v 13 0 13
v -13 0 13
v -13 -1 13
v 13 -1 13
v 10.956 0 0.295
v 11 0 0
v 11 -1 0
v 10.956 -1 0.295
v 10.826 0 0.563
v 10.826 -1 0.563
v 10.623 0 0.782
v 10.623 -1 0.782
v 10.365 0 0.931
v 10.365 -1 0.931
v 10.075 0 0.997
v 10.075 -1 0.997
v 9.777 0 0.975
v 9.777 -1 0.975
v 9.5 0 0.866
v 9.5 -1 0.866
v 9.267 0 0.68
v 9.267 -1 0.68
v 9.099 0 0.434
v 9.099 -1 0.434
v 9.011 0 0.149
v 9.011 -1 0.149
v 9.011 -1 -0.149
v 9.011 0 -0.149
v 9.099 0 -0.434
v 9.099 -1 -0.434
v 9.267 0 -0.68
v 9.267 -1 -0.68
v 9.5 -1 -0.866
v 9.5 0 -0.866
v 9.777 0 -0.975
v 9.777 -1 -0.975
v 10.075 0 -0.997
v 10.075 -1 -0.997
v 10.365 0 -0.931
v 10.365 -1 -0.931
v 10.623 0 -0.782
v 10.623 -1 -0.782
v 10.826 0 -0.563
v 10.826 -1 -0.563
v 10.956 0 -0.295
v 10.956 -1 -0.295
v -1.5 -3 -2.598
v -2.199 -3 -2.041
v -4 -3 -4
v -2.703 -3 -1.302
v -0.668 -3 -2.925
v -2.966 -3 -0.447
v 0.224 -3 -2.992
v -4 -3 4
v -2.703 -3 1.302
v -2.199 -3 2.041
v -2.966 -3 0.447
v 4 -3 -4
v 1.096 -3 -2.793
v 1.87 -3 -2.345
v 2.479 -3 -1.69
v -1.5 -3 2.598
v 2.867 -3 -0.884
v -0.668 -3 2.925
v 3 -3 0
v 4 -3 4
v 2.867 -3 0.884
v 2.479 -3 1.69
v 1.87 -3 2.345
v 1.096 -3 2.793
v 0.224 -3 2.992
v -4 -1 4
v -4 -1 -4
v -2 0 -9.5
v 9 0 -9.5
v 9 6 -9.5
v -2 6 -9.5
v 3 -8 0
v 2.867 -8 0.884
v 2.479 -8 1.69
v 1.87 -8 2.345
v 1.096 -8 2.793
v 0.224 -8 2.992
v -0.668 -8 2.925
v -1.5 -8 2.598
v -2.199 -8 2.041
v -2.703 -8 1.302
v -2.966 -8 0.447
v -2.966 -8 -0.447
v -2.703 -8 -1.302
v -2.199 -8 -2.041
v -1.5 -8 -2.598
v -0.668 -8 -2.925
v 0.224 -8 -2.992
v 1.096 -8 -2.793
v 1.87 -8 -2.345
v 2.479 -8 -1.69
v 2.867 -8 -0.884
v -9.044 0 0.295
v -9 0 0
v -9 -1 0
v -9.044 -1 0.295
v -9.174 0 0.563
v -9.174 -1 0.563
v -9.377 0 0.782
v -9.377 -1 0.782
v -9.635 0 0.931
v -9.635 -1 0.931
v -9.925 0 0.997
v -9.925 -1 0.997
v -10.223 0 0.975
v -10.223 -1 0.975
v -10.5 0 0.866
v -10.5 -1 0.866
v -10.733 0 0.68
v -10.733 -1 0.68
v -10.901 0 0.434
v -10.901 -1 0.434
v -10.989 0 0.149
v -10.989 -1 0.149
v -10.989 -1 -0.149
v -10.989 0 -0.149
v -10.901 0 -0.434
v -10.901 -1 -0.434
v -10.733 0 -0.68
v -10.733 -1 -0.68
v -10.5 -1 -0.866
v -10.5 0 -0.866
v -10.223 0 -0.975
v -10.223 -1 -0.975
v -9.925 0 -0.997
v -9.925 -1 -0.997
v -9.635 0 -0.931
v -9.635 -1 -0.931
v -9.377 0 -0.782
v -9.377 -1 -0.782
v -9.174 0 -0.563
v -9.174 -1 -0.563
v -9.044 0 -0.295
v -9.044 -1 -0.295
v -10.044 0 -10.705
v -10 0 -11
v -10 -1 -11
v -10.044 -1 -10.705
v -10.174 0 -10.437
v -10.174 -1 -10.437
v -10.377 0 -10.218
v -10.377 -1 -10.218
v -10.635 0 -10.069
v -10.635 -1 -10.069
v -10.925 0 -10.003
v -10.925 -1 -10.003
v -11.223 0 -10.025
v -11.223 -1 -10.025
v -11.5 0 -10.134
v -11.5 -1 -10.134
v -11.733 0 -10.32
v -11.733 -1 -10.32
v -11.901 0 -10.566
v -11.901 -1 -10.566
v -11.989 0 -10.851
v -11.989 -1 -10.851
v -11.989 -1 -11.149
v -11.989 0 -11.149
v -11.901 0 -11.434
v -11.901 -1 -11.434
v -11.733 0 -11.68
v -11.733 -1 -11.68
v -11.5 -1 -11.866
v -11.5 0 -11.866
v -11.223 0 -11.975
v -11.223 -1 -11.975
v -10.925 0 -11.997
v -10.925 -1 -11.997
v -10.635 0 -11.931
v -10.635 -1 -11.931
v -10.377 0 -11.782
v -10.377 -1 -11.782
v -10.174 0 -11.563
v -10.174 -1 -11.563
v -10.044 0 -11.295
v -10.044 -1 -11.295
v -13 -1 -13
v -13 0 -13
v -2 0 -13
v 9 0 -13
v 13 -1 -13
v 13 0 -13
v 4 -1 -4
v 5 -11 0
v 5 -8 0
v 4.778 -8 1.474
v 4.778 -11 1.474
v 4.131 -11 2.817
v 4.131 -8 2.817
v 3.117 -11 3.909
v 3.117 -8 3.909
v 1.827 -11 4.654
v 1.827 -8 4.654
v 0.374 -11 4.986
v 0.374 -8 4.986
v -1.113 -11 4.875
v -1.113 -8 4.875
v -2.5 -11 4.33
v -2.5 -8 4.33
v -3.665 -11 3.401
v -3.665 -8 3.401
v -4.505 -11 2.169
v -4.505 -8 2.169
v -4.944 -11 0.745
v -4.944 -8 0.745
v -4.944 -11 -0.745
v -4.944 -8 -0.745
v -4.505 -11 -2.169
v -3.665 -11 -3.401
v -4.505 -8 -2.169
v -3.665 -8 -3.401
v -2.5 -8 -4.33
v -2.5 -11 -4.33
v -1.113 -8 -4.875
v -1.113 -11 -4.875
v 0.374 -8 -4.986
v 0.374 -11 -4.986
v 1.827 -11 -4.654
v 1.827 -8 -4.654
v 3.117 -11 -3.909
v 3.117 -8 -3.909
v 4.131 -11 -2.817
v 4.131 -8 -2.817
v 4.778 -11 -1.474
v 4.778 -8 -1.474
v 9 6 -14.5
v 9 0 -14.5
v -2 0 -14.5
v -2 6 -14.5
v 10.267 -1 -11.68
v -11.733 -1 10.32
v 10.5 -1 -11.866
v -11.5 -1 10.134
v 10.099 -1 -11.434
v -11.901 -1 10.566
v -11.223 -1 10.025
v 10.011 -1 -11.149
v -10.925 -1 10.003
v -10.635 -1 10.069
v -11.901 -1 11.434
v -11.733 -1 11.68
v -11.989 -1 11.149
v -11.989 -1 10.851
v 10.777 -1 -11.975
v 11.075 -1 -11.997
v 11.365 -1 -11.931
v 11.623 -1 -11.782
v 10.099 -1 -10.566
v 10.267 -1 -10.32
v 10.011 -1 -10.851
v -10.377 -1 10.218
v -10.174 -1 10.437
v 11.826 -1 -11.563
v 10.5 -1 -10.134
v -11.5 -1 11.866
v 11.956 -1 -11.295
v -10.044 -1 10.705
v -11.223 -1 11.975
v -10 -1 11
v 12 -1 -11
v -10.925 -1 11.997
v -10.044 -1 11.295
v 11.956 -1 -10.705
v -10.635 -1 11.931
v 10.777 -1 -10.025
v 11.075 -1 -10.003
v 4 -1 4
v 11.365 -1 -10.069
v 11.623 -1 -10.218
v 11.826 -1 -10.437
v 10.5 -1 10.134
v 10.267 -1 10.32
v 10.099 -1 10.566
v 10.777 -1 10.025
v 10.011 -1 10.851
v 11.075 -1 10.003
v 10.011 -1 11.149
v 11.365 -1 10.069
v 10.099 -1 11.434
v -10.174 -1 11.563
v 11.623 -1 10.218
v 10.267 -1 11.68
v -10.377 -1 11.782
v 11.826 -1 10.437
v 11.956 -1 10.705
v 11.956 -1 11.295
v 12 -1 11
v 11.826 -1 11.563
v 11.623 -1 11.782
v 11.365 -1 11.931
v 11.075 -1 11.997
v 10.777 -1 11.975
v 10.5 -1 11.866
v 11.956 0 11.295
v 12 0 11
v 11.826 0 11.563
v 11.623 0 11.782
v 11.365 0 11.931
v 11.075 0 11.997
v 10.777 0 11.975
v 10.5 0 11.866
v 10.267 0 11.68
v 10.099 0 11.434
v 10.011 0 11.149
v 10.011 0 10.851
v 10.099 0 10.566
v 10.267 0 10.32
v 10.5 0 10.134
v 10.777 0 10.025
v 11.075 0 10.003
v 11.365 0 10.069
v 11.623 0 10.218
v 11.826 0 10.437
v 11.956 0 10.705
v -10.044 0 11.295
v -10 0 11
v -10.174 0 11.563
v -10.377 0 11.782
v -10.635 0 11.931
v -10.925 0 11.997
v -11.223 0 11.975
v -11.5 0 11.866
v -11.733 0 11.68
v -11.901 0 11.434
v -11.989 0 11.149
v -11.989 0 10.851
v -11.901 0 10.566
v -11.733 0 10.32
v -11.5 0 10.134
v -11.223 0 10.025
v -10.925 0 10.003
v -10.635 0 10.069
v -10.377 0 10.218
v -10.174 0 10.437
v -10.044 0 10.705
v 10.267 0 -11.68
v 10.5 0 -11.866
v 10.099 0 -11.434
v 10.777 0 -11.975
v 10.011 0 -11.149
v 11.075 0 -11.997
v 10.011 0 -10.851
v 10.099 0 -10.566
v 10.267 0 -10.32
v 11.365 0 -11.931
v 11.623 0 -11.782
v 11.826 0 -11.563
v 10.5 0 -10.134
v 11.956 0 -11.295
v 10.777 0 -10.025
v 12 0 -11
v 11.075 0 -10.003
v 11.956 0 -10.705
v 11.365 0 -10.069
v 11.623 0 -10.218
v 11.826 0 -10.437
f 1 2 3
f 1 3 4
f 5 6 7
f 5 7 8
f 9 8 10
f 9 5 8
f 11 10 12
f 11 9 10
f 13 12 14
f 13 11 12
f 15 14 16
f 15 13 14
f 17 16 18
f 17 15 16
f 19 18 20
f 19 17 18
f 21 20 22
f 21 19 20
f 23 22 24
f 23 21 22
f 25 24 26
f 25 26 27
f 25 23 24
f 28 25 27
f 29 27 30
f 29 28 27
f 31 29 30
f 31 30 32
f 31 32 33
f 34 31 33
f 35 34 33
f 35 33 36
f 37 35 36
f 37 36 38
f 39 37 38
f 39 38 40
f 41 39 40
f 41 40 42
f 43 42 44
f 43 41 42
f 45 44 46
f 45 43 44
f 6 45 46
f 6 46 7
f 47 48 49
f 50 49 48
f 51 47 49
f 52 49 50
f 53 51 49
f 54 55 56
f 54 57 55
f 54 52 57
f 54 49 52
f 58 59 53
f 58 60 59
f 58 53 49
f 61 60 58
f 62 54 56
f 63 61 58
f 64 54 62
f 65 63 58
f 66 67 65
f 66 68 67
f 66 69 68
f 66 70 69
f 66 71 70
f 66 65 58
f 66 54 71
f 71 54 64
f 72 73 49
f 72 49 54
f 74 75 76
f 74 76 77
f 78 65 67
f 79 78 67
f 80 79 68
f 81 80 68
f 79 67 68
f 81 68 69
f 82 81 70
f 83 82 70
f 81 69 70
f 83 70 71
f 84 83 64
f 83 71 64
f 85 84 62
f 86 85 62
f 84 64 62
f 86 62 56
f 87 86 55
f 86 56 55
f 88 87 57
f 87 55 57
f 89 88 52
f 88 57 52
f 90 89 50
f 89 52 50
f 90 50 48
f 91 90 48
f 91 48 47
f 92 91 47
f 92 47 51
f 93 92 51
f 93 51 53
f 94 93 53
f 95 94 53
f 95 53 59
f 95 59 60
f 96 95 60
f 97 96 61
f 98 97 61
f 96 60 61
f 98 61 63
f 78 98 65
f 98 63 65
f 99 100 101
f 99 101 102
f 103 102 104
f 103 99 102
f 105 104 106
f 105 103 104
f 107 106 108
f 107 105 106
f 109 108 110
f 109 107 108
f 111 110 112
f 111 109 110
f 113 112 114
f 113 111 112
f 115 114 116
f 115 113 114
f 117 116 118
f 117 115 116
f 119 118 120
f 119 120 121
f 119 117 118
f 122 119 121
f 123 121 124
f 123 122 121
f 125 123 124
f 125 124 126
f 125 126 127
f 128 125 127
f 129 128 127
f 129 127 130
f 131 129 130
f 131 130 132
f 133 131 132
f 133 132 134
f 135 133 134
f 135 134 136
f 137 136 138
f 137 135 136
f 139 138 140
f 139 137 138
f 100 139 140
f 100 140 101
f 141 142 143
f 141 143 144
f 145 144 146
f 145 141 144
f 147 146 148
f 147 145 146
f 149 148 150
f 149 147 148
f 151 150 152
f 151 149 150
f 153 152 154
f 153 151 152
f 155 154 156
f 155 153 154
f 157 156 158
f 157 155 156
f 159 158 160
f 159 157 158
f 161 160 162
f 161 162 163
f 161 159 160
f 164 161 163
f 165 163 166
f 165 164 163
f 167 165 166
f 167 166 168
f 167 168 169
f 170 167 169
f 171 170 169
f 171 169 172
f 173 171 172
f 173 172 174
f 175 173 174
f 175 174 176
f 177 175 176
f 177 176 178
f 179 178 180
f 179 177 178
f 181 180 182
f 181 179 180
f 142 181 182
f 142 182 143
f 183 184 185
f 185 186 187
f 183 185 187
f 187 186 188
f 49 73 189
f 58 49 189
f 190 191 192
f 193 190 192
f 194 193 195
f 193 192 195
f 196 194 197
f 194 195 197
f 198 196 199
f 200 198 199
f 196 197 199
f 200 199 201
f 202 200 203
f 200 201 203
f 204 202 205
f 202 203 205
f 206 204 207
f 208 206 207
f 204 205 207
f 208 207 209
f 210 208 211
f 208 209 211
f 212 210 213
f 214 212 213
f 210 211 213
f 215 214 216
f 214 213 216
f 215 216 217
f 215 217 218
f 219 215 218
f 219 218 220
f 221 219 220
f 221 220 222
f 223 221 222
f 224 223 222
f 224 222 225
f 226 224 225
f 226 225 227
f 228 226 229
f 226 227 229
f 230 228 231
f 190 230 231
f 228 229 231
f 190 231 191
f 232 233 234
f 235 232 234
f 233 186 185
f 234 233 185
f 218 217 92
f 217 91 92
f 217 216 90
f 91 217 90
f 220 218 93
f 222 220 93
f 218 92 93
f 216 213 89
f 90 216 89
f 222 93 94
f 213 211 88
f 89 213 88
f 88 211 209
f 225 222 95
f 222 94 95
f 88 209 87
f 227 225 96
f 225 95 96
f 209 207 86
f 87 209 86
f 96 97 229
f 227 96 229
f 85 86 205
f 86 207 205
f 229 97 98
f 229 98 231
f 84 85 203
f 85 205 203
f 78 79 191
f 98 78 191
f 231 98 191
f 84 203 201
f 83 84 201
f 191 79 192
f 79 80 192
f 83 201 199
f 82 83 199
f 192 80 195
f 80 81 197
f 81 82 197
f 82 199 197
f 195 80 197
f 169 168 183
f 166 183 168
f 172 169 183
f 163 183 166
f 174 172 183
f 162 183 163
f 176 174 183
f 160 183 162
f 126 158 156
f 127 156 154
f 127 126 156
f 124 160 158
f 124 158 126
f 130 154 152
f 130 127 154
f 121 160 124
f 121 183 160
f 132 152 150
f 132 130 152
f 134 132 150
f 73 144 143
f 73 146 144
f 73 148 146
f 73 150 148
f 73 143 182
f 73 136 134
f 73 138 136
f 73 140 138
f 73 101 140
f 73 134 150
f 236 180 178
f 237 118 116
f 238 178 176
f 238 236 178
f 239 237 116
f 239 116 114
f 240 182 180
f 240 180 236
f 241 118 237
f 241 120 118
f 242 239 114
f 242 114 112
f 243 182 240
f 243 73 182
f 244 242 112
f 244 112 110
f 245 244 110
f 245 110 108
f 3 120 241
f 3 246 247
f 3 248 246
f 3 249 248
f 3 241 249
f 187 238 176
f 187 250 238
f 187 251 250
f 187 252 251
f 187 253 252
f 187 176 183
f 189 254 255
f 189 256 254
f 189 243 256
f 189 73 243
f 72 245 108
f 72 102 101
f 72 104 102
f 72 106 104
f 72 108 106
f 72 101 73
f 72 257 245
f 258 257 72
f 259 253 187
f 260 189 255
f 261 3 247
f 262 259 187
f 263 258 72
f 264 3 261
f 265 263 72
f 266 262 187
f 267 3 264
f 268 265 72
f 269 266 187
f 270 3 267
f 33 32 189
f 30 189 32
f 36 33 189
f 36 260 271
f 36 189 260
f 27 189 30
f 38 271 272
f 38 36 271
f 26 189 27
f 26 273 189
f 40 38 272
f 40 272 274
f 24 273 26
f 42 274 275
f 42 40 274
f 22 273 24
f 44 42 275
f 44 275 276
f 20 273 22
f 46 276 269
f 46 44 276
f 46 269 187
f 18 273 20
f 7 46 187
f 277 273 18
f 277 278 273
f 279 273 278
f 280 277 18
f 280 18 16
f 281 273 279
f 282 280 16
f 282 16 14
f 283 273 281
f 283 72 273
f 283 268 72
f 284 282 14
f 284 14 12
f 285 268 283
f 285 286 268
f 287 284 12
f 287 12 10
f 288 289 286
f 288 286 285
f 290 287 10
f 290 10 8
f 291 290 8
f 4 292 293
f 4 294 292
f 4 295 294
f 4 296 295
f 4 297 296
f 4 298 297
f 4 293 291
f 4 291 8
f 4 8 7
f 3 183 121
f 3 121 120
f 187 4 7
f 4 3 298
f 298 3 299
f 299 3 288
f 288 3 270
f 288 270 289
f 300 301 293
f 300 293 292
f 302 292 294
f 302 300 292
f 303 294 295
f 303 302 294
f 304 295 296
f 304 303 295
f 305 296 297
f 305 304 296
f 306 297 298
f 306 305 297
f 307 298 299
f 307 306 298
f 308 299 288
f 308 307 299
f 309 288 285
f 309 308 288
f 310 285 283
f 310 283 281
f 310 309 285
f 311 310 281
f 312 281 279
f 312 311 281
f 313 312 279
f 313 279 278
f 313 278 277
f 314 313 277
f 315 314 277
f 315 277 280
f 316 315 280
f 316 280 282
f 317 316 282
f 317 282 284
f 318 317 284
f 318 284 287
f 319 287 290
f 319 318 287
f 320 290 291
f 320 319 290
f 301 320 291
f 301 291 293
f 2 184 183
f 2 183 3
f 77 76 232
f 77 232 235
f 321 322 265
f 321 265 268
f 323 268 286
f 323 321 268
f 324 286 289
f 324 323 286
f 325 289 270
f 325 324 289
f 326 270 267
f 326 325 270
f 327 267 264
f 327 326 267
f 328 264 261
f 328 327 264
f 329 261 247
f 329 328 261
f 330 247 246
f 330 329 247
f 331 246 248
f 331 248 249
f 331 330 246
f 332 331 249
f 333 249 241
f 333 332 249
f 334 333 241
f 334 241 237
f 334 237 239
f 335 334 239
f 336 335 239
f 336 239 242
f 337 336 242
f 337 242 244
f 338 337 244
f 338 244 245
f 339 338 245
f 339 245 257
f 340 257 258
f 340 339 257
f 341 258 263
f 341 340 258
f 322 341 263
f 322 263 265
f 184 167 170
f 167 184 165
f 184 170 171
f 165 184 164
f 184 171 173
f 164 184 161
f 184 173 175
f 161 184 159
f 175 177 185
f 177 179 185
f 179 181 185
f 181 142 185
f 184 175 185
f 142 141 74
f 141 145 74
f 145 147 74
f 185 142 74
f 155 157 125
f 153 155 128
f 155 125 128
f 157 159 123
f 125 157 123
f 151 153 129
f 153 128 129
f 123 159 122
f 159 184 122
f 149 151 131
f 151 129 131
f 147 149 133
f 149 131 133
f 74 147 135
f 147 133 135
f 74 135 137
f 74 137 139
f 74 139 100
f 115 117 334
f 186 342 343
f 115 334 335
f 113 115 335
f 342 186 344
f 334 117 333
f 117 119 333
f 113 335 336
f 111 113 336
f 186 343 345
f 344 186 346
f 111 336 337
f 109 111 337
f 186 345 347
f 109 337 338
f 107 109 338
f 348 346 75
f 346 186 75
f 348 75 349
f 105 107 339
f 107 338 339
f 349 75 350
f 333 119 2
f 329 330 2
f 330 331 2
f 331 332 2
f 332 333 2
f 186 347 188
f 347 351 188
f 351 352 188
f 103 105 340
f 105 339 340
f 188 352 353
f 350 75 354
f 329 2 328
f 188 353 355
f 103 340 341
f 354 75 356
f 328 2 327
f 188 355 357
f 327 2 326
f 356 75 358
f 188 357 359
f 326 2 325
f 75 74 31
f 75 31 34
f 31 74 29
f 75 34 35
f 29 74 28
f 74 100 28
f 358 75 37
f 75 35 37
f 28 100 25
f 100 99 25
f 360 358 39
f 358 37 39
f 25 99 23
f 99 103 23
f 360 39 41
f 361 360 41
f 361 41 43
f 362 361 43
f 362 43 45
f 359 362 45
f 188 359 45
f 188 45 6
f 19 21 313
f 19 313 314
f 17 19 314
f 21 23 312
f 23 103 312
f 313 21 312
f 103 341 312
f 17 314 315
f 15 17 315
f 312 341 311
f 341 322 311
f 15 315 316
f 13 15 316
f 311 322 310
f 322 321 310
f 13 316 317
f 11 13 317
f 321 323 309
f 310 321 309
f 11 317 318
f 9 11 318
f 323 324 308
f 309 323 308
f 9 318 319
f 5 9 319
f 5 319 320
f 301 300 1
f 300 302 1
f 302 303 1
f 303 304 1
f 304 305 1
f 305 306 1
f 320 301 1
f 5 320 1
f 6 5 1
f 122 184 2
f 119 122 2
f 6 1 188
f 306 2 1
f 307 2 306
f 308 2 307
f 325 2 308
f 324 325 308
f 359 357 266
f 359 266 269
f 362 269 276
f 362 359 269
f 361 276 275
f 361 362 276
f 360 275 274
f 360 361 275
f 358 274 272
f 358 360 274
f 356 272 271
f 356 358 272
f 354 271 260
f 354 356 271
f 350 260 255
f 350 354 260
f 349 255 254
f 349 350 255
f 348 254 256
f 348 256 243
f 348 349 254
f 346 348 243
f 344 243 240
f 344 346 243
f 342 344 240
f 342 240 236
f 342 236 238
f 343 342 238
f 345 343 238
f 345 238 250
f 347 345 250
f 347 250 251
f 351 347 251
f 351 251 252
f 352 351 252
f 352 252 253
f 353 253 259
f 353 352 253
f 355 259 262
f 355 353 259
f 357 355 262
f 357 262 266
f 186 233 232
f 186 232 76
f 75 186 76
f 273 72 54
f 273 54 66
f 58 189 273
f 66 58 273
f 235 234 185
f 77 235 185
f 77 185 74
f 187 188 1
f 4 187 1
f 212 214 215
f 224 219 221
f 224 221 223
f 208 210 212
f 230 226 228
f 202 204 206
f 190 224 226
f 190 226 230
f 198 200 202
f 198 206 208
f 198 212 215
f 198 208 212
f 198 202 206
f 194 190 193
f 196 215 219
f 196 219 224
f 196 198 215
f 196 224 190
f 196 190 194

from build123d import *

# Parameters (mm, degrees)
F0_W     = 26
F0_H     = 26
F0_R     = 1
F1_DEPTH = 1
F2_W     = 11
F2_H     = 5
F3_DEPTH = 6
F4_W     = 8
F4_H     = 8
F5_DEPTH = 2
F6_R     = 3
F7_DEPTH = 5
F8_R     = 5
F9_DEPTH = 3


with BuildPart() as f1:
    # F0 (on Front) → F1 (new body)
    with BuildSketch(Plane.XZ):
        Rectangle(F0_W, F0_H)
        with Locations((-11, -11)):
            Circle(F0_R, mode=Mode.SUBTRACT)
        with Locations((11, -11)):
            Circle(F0_R, mode=Mode.SUBTRACT)
        with Locations((-10, 0)):
            Circle(F0_R, mode=Mode.SUBTRACT)
        with Locations((-11, 11)):
            Circle(F0_R, mode=Mode.SUBTRACT)
        with Locations((10, 0)):
            Circle(F0_R, mode=Mode.SUBTRACT)
        with Locations((11, 11)):
            Circle(F0_R, mode=Mode.SUBTRACT)
    extrude(amount=F1_DEPTH)

    # F2 (on face) → F3 (join)
    with BuildSketch(Plane(origin=(0, 0, 0), x_dir=(-1, 0, 0), z_dir=(0, 1, 0))):
        with Locations((-3.5, -12)):
            Rectangle(F2_W, F2_H)
    extrude(amount=F3_DEPTH)

    # F4 (on face) → F5 (join)
    with BuildSketch(Plane.XZ.offset(1)):
        Rectangle(F4_W, F4_H)
    extrude(amount=F5_DEPTH)

    # F6 (on face) → F7 (join)
    with BuildSketch(Plane.XZ.offset(3)):
        Circle(F6_R)
    extrude(amount=F7_DEPTH)

    # F8 (on face) → F9 (join)
    with BuildSketch(Plane.XZ.offset(8)):
        Circle(F8_R)
    extrude(amount=F9_DEPTH)


solid = f1.part
